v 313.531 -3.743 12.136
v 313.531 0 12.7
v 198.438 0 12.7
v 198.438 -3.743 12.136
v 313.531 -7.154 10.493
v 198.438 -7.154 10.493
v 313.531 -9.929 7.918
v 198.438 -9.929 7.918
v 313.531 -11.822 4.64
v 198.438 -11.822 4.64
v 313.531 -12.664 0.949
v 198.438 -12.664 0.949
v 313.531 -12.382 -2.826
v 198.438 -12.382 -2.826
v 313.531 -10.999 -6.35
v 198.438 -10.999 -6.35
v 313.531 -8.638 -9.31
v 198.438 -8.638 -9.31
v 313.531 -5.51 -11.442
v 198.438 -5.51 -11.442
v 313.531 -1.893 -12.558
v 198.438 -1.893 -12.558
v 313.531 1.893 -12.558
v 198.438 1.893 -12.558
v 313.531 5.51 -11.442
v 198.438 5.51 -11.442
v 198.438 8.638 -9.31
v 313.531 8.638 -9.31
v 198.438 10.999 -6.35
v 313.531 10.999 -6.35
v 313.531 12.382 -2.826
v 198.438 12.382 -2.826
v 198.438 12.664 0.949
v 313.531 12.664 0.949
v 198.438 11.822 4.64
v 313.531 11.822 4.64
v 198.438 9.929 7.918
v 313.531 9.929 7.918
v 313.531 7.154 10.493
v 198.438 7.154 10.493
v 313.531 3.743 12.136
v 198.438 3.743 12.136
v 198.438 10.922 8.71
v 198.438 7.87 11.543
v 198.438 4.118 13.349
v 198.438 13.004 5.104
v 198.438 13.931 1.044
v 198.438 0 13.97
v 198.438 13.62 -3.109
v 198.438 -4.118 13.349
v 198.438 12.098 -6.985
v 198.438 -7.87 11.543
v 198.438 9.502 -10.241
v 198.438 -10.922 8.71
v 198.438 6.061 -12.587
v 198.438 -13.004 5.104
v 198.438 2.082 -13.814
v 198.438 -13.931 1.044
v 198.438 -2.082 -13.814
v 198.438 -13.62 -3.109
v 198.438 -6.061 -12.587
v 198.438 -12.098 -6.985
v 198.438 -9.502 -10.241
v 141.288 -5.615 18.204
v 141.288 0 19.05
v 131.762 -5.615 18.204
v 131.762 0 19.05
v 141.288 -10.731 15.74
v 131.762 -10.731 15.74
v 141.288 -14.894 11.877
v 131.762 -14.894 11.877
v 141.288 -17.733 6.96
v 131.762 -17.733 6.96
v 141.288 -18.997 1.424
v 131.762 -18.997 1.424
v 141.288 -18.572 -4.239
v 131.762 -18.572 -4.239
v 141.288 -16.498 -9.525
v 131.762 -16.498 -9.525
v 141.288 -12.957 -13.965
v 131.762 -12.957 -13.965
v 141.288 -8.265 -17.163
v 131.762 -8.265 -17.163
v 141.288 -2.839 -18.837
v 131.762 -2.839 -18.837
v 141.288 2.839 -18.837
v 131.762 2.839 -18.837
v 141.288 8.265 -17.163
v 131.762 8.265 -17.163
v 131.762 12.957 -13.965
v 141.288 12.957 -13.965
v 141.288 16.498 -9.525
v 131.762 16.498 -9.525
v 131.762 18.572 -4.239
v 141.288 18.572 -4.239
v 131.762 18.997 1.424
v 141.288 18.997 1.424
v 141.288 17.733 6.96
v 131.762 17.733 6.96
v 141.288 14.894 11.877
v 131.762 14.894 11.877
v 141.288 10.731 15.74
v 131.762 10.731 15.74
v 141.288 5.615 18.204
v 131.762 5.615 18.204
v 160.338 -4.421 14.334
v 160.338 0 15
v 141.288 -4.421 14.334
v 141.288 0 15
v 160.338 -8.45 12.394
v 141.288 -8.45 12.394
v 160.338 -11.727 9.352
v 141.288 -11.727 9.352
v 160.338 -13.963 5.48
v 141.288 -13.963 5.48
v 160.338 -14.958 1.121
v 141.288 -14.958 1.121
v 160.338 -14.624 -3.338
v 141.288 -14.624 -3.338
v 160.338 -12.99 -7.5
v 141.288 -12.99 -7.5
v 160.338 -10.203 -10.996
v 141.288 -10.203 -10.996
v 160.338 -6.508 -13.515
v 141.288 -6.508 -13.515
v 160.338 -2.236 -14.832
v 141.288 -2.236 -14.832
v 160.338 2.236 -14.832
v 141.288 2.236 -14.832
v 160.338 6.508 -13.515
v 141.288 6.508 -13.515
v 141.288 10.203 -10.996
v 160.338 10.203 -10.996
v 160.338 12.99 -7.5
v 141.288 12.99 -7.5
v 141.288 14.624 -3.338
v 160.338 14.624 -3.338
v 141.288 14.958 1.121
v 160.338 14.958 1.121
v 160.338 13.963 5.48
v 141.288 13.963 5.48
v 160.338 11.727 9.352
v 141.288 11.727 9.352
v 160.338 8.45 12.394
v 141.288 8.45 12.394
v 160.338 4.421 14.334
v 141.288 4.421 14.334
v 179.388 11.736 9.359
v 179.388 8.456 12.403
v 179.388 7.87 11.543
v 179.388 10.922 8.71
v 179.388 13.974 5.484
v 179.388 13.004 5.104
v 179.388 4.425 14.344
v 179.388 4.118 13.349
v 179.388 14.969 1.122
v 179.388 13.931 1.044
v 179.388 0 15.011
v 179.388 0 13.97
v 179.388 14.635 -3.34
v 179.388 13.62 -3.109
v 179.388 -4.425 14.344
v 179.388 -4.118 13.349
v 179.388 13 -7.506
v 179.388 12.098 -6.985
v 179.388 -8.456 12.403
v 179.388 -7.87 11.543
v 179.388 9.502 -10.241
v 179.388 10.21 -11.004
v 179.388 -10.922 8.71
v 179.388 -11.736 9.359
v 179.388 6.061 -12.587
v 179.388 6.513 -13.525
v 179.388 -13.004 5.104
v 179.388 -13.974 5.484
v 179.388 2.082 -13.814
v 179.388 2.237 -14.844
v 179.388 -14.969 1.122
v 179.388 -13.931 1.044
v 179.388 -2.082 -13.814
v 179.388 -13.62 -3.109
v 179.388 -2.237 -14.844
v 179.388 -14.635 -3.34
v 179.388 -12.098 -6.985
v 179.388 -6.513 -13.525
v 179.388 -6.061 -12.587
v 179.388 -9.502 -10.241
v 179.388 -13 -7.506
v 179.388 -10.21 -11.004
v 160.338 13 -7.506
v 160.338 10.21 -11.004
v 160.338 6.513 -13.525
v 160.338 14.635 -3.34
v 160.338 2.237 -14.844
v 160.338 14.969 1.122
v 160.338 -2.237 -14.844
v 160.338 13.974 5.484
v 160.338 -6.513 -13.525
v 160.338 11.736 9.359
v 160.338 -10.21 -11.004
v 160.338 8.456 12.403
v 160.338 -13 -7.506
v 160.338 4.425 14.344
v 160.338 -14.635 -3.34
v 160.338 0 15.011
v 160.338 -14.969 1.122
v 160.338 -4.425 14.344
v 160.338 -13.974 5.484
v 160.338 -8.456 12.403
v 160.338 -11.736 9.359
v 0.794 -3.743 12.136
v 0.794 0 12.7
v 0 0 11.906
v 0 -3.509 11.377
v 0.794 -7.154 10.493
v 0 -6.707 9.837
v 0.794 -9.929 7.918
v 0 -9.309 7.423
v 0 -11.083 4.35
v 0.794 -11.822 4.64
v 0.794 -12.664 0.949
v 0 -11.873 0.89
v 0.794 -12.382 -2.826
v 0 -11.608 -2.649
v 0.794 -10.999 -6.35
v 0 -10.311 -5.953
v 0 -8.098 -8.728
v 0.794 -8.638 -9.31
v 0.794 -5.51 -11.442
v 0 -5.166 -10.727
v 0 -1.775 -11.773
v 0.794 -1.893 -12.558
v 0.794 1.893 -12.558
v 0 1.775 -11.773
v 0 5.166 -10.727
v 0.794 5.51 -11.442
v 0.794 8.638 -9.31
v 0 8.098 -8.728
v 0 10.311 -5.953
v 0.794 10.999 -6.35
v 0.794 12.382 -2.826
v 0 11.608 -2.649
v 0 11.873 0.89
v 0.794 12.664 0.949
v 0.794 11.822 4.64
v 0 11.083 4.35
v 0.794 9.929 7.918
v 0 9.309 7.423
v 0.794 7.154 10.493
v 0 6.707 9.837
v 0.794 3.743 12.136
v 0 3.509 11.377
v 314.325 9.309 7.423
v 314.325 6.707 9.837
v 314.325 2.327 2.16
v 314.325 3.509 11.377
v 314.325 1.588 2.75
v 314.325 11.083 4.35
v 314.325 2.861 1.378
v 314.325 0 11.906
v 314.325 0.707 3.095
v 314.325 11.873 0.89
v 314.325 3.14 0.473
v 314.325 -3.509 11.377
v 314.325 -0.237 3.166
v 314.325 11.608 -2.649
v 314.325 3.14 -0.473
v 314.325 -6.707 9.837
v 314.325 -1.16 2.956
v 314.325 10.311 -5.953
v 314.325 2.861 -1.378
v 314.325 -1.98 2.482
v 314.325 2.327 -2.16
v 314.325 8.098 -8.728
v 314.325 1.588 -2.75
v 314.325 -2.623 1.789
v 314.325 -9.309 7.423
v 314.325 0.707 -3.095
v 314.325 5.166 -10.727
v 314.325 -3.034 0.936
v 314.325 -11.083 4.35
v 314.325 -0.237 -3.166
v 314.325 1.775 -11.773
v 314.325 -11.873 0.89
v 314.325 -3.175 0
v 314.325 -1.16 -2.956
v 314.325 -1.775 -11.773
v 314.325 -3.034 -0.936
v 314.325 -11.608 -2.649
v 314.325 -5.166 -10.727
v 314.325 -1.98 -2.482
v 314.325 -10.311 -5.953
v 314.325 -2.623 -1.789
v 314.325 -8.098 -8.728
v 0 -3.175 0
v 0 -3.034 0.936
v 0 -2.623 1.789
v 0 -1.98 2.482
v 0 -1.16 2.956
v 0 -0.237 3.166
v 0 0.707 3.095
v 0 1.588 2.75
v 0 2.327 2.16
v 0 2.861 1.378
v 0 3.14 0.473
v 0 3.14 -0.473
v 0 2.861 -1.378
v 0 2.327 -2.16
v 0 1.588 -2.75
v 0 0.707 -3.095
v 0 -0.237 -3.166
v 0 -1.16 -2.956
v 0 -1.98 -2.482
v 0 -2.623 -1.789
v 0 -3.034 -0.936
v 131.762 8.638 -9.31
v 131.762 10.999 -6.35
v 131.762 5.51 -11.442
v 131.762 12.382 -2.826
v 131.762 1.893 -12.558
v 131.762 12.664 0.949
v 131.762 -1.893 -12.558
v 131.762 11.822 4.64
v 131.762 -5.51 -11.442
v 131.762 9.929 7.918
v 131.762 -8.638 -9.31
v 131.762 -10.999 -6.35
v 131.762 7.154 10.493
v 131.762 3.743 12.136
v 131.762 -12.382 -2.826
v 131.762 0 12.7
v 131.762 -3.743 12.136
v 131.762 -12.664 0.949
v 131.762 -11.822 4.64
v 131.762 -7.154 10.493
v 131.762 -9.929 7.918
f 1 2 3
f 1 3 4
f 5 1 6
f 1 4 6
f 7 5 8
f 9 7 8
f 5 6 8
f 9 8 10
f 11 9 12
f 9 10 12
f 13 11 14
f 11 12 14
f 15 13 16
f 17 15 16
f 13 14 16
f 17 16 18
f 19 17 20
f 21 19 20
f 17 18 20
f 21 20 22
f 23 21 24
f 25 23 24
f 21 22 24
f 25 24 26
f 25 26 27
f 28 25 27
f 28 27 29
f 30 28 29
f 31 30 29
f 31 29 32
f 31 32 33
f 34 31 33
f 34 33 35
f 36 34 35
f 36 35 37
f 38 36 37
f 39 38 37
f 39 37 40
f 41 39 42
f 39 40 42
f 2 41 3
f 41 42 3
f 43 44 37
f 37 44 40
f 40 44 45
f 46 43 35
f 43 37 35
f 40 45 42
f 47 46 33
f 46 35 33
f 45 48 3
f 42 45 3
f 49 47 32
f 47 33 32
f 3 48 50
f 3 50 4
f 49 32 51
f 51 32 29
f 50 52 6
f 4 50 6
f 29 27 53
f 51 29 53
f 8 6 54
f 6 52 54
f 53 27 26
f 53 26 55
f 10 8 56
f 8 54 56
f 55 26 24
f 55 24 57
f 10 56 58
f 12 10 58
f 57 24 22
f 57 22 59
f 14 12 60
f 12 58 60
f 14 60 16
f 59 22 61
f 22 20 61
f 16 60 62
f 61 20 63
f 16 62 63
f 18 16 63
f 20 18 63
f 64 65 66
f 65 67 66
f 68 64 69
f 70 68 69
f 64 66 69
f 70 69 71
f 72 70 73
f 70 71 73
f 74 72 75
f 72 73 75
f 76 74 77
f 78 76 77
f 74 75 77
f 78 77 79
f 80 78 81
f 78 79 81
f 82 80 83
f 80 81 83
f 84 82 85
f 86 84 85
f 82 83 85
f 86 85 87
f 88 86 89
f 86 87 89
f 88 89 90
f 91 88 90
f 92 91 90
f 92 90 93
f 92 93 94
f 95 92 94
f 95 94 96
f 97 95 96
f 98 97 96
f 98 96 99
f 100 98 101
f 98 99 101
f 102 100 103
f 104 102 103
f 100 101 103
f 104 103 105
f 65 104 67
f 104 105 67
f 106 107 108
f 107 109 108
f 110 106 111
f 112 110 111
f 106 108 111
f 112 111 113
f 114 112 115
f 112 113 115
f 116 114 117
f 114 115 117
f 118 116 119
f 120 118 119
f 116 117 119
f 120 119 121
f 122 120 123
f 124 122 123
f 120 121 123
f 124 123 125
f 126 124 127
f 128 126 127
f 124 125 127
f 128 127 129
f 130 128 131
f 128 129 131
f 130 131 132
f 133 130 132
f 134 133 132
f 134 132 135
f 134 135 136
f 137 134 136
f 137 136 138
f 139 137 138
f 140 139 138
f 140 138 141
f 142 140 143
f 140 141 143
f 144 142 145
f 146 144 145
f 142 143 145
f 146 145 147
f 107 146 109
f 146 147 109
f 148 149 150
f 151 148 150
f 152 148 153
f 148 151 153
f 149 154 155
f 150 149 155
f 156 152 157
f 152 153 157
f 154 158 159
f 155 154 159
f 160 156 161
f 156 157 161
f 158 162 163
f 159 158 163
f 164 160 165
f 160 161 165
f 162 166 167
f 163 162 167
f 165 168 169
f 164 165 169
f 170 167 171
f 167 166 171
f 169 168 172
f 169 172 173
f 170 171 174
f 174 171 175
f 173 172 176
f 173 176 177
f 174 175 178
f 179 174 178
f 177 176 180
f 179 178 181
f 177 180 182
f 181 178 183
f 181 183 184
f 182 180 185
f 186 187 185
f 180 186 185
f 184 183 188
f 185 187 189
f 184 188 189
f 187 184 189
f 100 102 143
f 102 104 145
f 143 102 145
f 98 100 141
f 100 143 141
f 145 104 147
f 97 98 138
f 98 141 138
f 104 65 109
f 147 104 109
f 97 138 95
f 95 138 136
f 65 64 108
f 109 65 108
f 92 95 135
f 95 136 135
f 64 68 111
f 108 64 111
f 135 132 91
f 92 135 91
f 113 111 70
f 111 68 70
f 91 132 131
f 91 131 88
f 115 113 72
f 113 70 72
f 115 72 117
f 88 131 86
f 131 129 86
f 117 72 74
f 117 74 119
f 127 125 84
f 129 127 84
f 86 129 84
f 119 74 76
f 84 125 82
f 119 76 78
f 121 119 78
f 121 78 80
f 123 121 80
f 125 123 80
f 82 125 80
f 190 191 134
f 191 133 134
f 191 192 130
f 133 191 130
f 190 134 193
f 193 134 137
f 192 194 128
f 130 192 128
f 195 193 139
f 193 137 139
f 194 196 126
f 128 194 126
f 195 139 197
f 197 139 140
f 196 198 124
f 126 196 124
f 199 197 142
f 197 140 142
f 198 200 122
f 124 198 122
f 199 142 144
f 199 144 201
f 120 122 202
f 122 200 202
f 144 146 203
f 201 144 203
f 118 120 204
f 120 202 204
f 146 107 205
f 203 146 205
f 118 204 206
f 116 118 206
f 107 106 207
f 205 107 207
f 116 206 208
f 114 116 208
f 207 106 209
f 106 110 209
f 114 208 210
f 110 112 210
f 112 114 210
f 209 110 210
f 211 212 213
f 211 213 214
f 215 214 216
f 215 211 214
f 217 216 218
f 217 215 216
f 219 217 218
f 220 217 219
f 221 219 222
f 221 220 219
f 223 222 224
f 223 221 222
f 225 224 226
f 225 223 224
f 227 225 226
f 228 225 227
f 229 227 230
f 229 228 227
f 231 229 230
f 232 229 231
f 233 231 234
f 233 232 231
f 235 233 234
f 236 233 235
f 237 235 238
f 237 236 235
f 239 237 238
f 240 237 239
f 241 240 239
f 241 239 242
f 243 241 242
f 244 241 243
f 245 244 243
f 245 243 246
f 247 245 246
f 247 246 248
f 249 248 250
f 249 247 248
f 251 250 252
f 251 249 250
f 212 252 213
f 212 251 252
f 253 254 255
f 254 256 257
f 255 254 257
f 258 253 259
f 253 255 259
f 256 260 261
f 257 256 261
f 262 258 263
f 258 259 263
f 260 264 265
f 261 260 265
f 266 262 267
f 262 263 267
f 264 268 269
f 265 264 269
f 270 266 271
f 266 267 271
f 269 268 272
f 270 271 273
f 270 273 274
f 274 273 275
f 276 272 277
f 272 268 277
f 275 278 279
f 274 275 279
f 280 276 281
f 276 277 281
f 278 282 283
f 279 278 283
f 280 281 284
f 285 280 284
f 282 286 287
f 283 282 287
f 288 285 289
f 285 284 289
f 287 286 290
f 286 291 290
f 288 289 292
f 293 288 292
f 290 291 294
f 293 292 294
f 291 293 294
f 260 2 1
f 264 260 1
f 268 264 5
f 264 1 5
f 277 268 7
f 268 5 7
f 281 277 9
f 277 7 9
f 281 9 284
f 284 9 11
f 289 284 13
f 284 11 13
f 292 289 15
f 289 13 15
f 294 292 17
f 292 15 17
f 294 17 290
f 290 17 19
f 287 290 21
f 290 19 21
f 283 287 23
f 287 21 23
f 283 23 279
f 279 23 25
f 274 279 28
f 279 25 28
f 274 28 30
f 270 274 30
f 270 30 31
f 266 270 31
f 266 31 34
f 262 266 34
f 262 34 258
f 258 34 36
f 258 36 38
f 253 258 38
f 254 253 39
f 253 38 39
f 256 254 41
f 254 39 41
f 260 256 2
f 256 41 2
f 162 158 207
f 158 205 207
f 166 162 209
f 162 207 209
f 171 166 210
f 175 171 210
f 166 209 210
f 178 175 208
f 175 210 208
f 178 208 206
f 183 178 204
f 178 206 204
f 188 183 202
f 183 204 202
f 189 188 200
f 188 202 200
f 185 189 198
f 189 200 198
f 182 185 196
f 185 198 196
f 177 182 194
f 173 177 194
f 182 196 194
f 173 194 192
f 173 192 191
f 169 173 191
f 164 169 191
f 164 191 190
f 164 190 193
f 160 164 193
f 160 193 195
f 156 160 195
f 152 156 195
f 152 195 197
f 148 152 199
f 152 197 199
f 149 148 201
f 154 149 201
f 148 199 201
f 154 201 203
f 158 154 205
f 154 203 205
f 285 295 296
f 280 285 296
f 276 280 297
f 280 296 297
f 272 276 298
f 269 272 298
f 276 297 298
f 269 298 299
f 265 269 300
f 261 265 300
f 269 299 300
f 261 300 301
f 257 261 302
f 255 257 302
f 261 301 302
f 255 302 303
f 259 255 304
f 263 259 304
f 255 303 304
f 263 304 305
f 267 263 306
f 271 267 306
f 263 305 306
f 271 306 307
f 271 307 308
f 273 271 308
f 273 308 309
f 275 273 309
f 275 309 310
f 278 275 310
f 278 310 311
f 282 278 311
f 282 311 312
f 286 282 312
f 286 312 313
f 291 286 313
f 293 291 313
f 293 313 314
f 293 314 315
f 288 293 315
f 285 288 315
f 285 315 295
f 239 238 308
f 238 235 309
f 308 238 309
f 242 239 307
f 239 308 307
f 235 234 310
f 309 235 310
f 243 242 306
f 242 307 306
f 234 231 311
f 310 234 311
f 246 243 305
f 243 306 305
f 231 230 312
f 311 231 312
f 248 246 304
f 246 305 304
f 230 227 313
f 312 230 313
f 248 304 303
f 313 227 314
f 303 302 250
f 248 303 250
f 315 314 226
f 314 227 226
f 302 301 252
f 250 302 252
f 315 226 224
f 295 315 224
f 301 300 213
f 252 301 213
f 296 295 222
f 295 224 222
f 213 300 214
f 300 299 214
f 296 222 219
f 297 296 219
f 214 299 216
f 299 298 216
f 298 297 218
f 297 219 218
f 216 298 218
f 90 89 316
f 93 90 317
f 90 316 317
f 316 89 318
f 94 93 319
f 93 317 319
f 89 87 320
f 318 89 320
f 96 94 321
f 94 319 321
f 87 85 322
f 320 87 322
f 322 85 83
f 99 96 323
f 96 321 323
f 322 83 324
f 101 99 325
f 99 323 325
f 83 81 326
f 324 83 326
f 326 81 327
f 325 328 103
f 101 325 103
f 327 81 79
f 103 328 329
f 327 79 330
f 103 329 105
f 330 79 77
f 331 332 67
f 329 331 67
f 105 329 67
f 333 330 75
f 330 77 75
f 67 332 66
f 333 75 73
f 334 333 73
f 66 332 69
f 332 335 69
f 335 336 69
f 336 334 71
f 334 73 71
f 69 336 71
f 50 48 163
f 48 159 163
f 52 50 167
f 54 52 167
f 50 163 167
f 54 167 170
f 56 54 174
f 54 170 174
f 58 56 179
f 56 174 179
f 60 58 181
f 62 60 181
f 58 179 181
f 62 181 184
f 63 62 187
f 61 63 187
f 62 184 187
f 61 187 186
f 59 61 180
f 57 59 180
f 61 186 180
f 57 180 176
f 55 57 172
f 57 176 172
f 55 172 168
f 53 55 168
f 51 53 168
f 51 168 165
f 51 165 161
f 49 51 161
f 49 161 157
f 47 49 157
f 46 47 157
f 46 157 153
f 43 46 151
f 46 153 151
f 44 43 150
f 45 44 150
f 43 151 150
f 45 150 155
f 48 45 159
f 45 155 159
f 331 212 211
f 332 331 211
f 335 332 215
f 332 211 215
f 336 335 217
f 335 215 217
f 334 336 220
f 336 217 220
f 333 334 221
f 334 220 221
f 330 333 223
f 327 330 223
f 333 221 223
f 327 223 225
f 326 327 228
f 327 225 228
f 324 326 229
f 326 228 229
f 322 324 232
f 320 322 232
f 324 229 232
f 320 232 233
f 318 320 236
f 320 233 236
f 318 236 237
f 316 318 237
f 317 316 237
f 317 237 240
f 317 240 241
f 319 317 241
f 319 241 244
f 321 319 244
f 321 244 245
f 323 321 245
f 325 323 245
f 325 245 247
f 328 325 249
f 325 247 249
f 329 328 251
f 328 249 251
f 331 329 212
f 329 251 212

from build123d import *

# Parameters (mm, degrees)
F2_R     = 3.175
F3_DEPTH = 314.326
F4_SIZE  = 0.79375


with BuildPart() as f1:
    # F0 (on Front) → F1 (revolve)
    with BuildSketch(Plane.XZ):
        Polygon((0, 12.7), (0, 0), (314.325, 0), (314.325, 12.7), (198.4375, 12.7), (198.4375, 13.97), (179.3875, 13.97), (179.3875, 15.0114), (160.3375, 15.0114), (160.3375, 14.99997), (141.2875, 14.99997), (141.2875, 19.05), (131.7625, 19.05), (131.7625, 12.7), align=None)
    revolve(axis=Axis((157.1625, 0, 0), (1, 0, 0)))

    # F2 (on face) → F3 (cut, through all)
    with BuildSketch(Plane(origin=(0, 0, 0), x_dir=(0, -1, 0), z_dir=(-1, 0, 0))):
        Circle(F2_R)
    extrude(amount=-F3_DEPTH, mode=Mode.SUBTRACT)

    # F4
    f4_edges = [f1.edges().sort_by_distance(p)[0] for p in [
        (0, 0, -12.7),
        (314.325, 0, -12.7),
    ]]
    chamfer(f4_edges, length=F4_SIZE)


solid = f1.part
